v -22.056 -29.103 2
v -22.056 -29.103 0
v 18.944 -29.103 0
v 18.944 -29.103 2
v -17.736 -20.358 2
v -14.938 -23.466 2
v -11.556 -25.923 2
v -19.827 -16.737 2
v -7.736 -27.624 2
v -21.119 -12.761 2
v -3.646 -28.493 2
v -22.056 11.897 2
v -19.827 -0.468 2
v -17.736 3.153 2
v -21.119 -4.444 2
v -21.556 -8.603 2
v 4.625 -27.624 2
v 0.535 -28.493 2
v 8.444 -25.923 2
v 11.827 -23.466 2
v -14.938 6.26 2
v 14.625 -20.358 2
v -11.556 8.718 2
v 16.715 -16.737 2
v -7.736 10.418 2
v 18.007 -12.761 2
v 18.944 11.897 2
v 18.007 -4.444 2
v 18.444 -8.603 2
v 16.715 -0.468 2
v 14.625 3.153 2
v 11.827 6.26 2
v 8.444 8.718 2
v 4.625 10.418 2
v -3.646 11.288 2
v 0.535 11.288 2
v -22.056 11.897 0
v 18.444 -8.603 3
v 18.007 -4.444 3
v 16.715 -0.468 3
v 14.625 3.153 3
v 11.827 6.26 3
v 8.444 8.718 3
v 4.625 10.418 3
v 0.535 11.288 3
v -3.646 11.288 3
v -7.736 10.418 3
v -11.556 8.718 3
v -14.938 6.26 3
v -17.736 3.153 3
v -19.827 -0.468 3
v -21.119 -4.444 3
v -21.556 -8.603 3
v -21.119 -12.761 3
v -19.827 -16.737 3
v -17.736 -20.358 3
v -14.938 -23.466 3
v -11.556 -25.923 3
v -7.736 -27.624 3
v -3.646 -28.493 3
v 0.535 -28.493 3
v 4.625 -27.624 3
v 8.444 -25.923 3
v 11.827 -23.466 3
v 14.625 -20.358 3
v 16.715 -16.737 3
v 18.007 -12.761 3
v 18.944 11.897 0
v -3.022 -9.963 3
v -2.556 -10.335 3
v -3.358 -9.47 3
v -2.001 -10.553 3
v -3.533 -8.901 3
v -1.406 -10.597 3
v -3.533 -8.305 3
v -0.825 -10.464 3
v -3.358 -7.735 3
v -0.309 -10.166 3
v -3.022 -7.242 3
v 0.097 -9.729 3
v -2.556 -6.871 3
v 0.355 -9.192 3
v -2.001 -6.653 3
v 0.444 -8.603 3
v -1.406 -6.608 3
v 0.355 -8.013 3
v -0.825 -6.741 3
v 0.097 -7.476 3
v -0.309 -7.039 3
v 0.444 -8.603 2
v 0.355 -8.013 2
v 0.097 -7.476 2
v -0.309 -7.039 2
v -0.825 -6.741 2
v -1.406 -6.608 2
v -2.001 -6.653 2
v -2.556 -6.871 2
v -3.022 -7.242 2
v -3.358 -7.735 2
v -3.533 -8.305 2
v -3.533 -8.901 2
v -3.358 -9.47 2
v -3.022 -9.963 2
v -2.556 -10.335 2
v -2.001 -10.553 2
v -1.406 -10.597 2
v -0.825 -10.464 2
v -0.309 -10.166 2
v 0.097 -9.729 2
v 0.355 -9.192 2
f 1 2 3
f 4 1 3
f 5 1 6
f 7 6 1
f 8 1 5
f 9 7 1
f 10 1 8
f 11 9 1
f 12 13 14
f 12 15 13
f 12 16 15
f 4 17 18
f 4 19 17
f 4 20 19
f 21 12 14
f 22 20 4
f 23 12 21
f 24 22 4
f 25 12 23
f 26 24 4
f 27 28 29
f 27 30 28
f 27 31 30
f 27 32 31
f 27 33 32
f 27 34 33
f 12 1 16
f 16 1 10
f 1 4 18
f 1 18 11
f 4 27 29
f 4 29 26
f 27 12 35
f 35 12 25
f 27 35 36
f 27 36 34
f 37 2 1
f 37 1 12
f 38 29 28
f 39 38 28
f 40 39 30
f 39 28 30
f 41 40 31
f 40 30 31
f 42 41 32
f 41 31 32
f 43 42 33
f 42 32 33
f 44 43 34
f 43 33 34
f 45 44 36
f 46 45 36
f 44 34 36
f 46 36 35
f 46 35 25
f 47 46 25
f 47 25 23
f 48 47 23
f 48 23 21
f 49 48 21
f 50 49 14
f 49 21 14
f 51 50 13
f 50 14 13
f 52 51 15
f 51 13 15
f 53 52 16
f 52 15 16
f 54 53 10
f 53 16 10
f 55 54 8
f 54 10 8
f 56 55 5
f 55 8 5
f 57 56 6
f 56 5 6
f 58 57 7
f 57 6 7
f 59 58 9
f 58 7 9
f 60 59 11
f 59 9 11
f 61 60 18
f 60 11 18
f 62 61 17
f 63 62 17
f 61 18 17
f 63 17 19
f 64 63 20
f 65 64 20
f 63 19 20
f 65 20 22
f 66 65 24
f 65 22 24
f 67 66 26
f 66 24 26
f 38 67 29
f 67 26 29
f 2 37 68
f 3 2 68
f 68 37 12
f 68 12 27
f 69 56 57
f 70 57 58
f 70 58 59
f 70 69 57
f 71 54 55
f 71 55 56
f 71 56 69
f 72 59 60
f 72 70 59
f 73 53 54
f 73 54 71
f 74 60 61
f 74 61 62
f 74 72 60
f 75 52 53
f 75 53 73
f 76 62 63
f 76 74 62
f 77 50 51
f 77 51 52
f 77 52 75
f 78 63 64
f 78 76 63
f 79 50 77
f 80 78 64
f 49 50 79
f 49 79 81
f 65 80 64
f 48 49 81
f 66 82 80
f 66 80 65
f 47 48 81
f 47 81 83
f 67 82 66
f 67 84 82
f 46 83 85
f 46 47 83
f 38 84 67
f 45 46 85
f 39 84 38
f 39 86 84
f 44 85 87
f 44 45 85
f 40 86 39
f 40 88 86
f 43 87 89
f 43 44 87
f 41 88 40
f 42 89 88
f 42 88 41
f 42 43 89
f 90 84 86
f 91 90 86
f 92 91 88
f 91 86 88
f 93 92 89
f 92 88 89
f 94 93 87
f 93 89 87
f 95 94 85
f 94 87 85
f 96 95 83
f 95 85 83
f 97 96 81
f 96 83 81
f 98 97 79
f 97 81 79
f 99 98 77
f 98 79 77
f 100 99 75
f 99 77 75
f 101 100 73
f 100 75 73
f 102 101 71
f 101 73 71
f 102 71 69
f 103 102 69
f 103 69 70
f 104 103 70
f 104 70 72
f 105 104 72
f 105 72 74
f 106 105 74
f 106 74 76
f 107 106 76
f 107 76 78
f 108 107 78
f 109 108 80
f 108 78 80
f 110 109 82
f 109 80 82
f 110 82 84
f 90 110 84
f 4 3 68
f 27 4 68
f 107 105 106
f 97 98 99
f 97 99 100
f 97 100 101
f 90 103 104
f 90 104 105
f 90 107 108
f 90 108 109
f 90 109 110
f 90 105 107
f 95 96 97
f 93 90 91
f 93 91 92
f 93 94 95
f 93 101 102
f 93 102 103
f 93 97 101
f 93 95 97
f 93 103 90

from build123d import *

# Parameters (mm, degrees)
SKETCH1_W           = 41
SKETCH1_H           = 41
BOSS_EXTRUDE1_DEPTH = 2
SKETCH2_R           = 20
BOSS_EXTRUDE2_DEPTH = 1
SKETCH3_R           = 2
CUT_EXTRUDE1_DEPTH  = 1


with BuildPart() as part:
    # Sketch1 → Boss-Extrude1 (new body)
    with BuildSketch(Plane.XY):
        with Locations((-1.555803571, -8.602678571)):
            Rectangle(SKETCH1_W, SKETCH1_H)
    extrude(amount=BOSS_EXTRUDE1_DEPTH)

    # Sketch2 → Boss-Extrude2 (add)
    with BuildSketch(Plane.XY.offset(2)):
        with Locations((-1.555803571, -8.602678571)):
            Circle(SKETCH2_R)
    extrude(amount=BOSS_EXTRUDE2_DEPTH)

    # Sketch3 → Cut-Extrude1 (cut)
    with BuildSketch(Plane.XY.offset(3)):
        with Locations((-1.555803571, -8.602678571)):
            Circle(SKETCH3_R)
    extrude(amount=-CUT_EXTRUDE1_DEPTH, mode=Mode.SUBTRACT)


solid = part.part
